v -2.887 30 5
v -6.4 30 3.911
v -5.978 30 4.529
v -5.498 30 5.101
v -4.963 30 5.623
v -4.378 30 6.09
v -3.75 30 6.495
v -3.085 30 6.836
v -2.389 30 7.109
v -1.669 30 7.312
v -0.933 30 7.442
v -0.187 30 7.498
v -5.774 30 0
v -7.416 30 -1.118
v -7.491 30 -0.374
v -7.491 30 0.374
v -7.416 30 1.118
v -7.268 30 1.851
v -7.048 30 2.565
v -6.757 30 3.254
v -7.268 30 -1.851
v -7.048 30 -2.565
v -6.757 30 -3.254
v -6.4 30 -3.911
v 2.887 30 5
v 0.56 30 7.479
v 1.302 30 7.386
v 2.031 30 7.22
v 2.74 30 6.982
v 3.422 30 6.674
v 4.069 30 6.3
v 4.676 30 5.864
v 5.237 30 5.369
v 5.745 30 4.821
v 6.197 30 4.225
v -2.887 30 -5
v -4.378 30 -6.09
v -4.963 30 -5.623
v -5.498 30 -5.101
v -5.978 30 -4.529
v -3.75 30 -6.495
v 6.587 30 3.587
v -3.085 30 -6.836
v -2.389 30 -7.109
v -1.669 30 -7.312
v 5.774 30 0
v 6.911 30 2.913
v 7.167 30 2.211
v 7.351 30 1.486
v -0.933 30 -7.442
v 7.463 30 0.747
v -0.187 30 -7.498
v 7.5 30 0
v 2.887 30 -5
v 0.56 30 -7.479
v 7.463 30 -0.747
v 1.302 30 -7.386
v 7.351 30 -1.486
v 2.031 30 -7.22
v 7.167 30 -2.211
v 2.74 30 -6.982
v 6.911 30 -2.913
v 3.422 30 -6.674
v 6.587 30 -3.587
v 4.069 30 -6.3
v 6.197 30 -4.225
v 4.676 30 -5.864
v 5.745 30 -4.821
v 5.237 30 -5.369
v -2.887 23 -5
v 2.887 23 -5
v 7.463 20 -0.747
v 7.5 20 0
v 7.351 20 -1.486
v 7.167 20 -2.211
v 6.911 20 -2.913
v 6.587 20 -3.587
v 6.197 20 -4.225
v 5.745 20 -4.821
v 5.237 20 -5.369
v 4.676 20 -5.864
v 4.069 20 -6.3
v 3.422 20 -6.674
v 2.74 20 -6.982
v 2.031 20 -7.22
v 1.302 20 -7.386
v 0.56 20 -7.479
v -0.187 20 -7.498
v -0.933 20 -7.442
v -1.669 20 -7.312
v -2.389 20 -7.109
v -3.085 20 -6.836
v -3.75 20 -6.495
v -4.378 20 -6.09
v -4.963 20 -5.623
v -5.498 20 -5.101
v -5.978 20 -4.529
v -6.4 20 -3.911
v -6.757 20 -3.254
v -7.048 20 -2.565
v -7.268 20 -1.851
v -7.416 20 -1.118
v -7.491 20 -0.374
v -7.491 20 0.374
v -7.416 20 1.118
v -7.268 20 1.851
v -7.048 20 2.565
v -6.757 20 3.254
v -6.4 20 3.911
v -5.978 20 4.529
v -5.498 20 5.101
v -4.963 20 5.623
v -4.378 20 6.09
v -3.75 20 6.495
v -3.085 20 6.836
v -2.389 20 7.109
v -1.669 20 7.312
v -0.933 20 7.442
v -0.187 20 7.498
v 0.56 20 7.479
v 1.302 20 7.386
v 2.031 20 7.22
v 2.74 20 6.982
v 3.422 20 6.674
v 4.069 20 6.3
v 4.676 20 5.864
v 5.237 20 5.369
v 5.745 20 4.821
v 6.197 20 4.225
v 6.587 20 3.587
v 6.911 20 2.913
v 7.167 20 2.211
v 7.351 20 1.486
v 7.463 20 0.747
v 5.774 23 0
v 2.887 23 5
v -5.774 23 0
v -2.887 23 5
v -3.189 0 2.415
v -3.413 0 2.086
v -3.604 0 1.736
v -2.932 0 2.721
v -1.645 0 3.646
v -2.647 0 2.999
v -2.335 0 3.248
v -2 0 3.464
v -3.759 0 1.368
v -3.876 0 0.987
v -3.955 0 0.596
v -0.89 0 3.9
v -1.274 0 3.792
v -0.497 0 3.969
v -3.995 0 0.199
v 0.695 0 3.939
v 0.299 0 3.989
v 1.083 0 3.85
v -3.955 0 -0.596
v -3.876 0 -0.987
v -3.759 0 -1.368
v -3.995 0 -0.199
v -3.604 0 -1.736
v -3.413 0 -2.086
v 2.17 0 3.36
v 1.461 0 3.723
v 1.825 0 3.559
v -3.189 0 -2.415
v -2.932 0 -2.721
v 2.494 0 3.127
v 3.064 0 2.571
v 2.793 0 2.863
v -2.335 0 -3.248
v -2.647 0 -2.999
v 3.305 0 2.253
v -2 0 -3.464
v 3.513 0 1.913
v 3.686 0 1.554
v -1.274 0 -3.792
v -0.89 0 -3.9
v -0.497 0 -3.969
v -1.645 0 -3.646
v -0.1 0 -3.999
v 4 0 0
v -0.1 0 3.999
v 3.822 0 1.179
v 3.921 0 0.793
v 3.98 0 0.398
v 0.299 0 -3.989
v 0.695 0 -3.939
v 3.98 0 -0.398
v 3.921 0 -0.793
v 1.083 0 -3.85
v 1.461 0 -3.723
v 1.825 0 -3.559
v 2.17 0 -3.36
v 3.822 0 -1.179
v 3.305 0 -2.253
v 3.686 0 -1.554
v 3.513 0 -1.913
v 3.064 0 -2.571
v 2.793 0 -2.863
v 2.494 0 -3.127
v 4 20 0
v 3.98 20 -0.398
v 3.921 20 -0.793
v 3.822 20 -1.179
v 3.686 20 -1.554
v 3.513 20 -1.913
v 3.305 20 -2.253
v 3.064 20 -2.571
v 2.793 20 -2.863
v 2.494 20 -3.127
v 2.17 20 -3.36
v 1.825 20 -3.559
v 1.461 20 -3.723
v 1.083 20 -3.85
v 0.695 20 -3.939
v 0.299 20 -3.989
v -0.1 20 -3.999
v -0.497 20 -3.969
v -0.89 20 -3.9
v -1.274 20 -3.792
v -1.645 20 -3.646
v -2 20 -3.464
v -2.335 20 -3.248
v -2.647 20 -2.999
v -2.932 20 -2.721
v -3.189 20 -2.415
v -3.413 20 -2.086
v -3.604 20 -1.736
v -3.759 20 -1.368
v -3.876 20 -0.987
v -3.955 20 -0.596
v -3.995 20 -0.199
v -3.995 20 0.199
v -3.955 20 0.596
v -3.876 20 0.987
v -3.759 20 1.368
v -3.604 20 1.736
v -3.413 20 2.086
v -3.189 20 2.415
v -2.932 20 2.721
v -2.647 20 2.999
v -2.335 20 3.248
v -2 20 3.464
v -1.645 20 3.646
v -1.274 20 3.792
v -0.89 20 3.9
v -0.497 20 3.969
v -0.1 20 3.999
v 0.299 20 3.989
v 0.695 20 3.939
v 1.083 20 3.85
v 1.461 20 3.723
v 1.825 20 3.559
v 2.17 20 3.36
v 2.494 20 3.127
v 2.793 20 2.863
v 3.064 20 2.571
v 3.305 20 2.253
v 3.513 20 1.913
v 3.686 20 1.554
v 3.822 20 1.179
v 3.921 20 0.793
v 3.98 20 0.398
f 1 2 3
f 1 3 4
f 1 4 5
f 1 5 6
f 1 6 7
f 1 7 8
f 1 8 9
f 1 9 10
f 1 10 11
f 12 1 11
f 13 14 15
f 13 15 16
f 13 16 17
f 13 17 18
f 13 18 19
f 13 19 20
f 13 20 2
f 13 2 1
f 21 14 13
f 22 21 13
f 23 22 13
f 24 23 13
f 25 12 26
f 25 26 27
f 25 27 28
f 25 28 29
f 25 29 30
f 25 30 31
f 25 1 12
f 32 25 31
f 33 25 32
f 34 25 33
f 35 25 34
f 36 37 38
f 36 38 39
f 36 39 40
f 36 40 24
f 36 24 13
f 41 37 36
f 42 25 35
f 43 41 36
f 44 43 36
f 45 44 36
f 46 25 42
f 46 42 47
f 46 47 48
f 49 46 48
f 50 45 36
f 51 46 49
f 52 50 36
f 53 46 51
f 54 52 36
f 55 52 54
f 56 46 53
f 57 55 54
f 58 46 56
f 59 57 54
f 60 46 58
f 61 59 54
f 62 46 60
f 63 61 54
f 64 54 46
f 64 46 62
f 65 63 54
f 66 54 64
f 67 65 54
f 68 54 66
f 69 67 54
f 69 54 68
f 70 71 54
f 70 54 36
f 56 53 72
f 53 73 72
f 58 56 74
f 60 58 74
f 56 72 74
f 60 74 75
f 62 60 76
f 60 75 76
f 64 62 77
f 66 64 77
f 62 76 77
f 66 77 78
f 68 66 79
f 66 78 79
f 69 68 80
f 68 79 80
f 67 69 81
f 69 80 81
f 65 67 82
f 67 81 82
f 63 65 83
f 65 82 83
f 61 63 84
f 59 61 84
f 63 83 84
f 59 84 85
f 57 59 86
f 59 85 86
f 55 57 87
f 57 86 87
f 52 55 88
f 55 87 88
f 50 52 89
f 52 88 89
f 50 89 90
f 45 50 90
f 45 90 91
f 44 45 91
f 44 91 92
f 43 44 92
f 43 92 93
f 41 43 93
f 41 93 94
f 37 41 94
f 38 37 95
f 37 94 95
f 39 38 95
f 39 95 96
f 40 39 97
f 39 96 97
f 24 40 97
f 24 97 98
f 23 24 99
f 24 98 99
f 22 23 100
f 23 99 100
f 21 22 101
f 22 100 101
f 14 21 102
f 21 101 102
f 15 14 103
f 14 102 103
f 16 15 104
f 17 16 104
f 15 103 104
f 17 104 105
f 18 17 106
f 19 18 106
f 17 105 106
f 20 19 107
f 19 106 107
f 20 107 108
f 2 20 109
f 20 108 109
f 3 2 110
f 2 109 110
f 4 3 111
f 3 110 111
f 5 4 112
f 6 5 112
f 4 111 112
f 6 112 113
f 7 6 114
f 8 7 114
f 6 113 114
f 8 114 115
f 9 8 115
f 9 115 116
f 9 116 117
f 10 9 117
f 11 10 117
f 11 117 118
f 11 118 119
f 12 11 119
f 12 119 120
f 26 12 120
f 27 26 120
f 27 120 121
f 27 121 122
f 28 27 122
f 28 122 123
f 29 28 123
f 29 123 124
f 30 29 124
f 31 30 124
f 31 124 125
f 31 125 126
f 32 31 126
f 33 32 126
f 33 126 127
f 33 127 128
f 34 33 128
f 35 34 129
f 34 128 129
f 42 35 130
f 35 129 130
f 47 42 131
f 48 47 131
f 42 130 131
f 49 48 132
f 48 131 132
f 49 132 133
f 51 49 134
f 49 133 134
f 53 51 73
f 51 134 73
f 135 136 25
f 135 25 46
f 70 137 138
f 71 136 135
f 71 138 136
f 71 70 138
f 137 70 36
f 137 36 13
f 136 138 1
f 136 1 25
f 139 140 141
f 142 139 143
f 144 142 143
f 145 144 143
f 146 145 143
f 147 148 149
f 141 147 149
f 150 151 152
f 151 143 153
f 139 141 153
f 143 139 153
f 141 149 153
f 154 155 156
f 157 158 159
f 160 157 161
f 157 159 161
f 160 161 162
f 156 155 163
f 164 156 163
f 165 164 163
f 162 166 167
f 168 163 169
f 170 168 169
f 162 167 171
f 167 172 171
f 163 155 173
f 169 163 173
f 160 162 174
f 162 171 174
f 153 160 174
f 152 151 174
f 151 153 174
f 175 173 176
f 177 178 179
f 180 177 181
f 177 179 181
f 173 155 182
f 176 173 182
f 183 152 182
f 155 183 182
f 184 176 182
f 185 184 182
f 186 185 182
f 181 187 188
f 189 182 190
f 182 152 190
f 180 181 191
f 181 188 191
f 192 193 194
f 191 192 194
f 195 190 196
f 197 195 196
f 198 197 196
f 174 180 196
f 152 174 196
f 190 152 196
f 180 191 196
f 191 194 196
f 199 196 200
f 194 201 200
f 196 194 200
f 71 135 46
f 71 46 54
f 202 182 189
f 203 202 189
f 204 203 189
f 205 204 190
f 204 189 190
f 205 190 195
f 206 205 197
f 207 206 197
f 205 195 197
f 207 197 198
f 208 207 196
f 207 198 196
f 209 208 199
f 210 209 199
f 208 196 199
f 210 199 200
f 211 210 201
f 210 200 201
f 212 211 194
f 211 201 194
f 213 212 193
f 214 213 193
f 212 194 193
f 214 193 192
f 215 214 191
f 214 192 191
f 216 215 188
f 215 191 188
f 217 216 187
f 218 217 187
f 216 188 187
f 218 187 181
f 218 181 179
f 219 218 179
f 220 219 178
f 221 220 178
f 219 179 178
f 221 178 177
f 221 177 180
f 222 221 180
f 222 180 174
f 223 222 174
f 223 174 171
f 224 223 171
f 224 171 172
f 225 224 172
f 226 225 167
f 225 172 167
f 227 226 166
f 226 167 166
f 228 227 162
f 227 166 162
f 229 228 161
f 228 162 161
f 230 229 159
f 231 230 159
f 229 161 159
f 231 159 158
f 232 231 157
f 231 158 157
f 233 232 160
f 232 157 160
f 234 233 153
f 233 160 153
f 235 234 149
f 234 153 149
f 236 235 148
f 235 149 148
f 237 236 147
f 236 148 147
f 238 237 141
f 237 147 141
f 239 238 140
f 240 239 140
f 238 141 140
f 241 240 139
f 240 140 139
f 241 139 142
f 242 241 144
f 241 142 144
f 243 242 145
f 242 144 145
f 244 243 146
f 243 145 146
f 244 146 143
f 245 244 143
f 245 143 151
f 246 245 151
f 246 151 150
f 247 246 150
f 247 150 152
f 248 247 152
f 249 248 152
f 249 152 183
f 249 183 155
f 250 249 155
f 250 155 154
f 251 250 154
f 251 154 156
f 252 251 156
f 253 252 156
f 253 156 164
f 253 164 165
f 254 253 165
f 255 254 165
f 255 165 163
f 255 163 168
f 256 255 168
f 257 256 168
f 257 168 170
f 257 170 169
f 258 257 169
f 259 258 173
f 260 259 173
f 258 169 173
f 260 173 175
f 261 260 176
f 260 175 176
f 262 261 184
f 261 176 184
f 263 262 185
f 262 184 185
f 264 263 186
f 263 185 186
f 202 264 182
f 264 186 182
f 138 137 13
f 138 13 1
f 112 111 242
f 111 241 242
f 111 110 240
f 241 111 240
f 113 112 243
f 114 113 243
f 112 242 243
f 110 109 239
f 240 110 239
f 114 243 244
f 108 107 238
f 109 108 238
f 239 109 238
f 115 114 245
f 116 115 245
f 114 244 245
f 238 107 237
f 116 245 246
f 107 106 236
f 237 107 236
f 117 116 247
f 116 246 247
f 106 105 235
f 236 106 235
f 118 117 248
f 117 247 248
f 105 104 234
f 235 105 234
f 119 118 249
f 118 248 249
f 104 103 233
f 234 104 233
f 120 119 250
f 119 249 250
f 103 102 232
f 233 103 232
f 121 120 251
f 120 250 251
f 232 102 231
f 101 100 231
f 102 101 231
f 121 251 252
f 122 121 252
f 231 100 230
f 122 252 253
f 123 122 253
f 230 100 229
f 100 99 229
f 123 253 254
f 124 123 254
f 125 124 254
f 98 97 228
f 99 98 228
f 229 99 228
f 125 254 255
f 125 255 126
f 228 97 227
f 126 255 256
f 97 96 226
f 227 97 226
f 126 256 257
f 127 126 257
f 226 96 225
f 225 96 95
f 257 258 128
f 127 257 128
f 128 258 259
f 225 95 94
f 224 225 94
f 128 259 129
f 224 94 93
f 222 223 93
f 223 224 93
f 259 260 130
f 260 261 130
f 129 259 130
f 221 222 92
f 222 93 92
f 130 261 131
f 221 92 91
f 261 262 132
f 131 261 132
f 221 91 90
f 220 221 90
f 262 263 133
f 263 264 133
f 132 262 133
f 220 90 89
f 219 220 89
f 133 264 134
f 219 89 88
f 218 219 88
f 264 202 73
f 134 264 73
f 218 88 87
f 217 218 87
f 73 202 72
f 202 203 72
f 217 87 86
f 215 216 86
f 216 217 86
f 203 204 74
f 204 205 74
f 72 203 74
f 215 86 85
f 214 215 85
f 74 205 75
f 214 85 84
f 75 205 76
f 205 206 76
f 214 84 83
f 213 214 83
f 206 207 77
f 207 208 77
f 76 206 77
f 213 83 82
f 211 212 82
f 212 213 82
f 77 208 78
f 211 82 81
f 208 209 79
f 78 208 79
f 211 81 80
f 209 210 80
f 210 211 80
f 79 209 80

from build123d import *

# Parameters (mm, degrees)
SKETCH1_R           = 4
BOSS_EXTRUDE1_DEPTH = 20
SKETCH2_R           = 7.5
BOSS_EXTRUDE2_DEPTH = 3
SKETCH3_R           = 7.5
BOSS_EXTRUDE3_DEPTH = 7


with BuildPart() as part:
    # Sketch1 → Boss-Extrude1 (new body)
    with BuildSketch(Plane(origin=(0, 0, 0), x_dir=(1, 0, 0), z_dir=(0, 1, 0))):
        Circle(SKETCH1_R)
    extrude(amount=BOSS_EXTRUDE1_DEPTH)

    # Sketch2 → Boss-Extrude2 (add)
    with BuildSketch(Plane(origin=(0, 20, 0), x_dir=(1, 0, 0), z_dir=(0, 1, 0))):
        Circle(SKETCH2_R)
    extrude(amount=BOSS_EXTRUDE2_DEPTH)

    # Sketch3 → Boss-Extrude3 (add)
    with BuildSketch(Plane(origin=(0, 23, 0), x_dir=(1, 0, 0), z_dir=(0, 1, 0))):
        Circle(SKETCH3_R)
        Polygon((5.773502692, 0), (2.886751346, 5), (-2.886751346, 5), (-5.773502692, 0), (-2.886751346, -5), (2.886751346, -5), align=None, mode=Mode.SUBTRACT)
    extrude(amount=BOSS_EXTRUDE3_DEPTH)


solid = part.part
